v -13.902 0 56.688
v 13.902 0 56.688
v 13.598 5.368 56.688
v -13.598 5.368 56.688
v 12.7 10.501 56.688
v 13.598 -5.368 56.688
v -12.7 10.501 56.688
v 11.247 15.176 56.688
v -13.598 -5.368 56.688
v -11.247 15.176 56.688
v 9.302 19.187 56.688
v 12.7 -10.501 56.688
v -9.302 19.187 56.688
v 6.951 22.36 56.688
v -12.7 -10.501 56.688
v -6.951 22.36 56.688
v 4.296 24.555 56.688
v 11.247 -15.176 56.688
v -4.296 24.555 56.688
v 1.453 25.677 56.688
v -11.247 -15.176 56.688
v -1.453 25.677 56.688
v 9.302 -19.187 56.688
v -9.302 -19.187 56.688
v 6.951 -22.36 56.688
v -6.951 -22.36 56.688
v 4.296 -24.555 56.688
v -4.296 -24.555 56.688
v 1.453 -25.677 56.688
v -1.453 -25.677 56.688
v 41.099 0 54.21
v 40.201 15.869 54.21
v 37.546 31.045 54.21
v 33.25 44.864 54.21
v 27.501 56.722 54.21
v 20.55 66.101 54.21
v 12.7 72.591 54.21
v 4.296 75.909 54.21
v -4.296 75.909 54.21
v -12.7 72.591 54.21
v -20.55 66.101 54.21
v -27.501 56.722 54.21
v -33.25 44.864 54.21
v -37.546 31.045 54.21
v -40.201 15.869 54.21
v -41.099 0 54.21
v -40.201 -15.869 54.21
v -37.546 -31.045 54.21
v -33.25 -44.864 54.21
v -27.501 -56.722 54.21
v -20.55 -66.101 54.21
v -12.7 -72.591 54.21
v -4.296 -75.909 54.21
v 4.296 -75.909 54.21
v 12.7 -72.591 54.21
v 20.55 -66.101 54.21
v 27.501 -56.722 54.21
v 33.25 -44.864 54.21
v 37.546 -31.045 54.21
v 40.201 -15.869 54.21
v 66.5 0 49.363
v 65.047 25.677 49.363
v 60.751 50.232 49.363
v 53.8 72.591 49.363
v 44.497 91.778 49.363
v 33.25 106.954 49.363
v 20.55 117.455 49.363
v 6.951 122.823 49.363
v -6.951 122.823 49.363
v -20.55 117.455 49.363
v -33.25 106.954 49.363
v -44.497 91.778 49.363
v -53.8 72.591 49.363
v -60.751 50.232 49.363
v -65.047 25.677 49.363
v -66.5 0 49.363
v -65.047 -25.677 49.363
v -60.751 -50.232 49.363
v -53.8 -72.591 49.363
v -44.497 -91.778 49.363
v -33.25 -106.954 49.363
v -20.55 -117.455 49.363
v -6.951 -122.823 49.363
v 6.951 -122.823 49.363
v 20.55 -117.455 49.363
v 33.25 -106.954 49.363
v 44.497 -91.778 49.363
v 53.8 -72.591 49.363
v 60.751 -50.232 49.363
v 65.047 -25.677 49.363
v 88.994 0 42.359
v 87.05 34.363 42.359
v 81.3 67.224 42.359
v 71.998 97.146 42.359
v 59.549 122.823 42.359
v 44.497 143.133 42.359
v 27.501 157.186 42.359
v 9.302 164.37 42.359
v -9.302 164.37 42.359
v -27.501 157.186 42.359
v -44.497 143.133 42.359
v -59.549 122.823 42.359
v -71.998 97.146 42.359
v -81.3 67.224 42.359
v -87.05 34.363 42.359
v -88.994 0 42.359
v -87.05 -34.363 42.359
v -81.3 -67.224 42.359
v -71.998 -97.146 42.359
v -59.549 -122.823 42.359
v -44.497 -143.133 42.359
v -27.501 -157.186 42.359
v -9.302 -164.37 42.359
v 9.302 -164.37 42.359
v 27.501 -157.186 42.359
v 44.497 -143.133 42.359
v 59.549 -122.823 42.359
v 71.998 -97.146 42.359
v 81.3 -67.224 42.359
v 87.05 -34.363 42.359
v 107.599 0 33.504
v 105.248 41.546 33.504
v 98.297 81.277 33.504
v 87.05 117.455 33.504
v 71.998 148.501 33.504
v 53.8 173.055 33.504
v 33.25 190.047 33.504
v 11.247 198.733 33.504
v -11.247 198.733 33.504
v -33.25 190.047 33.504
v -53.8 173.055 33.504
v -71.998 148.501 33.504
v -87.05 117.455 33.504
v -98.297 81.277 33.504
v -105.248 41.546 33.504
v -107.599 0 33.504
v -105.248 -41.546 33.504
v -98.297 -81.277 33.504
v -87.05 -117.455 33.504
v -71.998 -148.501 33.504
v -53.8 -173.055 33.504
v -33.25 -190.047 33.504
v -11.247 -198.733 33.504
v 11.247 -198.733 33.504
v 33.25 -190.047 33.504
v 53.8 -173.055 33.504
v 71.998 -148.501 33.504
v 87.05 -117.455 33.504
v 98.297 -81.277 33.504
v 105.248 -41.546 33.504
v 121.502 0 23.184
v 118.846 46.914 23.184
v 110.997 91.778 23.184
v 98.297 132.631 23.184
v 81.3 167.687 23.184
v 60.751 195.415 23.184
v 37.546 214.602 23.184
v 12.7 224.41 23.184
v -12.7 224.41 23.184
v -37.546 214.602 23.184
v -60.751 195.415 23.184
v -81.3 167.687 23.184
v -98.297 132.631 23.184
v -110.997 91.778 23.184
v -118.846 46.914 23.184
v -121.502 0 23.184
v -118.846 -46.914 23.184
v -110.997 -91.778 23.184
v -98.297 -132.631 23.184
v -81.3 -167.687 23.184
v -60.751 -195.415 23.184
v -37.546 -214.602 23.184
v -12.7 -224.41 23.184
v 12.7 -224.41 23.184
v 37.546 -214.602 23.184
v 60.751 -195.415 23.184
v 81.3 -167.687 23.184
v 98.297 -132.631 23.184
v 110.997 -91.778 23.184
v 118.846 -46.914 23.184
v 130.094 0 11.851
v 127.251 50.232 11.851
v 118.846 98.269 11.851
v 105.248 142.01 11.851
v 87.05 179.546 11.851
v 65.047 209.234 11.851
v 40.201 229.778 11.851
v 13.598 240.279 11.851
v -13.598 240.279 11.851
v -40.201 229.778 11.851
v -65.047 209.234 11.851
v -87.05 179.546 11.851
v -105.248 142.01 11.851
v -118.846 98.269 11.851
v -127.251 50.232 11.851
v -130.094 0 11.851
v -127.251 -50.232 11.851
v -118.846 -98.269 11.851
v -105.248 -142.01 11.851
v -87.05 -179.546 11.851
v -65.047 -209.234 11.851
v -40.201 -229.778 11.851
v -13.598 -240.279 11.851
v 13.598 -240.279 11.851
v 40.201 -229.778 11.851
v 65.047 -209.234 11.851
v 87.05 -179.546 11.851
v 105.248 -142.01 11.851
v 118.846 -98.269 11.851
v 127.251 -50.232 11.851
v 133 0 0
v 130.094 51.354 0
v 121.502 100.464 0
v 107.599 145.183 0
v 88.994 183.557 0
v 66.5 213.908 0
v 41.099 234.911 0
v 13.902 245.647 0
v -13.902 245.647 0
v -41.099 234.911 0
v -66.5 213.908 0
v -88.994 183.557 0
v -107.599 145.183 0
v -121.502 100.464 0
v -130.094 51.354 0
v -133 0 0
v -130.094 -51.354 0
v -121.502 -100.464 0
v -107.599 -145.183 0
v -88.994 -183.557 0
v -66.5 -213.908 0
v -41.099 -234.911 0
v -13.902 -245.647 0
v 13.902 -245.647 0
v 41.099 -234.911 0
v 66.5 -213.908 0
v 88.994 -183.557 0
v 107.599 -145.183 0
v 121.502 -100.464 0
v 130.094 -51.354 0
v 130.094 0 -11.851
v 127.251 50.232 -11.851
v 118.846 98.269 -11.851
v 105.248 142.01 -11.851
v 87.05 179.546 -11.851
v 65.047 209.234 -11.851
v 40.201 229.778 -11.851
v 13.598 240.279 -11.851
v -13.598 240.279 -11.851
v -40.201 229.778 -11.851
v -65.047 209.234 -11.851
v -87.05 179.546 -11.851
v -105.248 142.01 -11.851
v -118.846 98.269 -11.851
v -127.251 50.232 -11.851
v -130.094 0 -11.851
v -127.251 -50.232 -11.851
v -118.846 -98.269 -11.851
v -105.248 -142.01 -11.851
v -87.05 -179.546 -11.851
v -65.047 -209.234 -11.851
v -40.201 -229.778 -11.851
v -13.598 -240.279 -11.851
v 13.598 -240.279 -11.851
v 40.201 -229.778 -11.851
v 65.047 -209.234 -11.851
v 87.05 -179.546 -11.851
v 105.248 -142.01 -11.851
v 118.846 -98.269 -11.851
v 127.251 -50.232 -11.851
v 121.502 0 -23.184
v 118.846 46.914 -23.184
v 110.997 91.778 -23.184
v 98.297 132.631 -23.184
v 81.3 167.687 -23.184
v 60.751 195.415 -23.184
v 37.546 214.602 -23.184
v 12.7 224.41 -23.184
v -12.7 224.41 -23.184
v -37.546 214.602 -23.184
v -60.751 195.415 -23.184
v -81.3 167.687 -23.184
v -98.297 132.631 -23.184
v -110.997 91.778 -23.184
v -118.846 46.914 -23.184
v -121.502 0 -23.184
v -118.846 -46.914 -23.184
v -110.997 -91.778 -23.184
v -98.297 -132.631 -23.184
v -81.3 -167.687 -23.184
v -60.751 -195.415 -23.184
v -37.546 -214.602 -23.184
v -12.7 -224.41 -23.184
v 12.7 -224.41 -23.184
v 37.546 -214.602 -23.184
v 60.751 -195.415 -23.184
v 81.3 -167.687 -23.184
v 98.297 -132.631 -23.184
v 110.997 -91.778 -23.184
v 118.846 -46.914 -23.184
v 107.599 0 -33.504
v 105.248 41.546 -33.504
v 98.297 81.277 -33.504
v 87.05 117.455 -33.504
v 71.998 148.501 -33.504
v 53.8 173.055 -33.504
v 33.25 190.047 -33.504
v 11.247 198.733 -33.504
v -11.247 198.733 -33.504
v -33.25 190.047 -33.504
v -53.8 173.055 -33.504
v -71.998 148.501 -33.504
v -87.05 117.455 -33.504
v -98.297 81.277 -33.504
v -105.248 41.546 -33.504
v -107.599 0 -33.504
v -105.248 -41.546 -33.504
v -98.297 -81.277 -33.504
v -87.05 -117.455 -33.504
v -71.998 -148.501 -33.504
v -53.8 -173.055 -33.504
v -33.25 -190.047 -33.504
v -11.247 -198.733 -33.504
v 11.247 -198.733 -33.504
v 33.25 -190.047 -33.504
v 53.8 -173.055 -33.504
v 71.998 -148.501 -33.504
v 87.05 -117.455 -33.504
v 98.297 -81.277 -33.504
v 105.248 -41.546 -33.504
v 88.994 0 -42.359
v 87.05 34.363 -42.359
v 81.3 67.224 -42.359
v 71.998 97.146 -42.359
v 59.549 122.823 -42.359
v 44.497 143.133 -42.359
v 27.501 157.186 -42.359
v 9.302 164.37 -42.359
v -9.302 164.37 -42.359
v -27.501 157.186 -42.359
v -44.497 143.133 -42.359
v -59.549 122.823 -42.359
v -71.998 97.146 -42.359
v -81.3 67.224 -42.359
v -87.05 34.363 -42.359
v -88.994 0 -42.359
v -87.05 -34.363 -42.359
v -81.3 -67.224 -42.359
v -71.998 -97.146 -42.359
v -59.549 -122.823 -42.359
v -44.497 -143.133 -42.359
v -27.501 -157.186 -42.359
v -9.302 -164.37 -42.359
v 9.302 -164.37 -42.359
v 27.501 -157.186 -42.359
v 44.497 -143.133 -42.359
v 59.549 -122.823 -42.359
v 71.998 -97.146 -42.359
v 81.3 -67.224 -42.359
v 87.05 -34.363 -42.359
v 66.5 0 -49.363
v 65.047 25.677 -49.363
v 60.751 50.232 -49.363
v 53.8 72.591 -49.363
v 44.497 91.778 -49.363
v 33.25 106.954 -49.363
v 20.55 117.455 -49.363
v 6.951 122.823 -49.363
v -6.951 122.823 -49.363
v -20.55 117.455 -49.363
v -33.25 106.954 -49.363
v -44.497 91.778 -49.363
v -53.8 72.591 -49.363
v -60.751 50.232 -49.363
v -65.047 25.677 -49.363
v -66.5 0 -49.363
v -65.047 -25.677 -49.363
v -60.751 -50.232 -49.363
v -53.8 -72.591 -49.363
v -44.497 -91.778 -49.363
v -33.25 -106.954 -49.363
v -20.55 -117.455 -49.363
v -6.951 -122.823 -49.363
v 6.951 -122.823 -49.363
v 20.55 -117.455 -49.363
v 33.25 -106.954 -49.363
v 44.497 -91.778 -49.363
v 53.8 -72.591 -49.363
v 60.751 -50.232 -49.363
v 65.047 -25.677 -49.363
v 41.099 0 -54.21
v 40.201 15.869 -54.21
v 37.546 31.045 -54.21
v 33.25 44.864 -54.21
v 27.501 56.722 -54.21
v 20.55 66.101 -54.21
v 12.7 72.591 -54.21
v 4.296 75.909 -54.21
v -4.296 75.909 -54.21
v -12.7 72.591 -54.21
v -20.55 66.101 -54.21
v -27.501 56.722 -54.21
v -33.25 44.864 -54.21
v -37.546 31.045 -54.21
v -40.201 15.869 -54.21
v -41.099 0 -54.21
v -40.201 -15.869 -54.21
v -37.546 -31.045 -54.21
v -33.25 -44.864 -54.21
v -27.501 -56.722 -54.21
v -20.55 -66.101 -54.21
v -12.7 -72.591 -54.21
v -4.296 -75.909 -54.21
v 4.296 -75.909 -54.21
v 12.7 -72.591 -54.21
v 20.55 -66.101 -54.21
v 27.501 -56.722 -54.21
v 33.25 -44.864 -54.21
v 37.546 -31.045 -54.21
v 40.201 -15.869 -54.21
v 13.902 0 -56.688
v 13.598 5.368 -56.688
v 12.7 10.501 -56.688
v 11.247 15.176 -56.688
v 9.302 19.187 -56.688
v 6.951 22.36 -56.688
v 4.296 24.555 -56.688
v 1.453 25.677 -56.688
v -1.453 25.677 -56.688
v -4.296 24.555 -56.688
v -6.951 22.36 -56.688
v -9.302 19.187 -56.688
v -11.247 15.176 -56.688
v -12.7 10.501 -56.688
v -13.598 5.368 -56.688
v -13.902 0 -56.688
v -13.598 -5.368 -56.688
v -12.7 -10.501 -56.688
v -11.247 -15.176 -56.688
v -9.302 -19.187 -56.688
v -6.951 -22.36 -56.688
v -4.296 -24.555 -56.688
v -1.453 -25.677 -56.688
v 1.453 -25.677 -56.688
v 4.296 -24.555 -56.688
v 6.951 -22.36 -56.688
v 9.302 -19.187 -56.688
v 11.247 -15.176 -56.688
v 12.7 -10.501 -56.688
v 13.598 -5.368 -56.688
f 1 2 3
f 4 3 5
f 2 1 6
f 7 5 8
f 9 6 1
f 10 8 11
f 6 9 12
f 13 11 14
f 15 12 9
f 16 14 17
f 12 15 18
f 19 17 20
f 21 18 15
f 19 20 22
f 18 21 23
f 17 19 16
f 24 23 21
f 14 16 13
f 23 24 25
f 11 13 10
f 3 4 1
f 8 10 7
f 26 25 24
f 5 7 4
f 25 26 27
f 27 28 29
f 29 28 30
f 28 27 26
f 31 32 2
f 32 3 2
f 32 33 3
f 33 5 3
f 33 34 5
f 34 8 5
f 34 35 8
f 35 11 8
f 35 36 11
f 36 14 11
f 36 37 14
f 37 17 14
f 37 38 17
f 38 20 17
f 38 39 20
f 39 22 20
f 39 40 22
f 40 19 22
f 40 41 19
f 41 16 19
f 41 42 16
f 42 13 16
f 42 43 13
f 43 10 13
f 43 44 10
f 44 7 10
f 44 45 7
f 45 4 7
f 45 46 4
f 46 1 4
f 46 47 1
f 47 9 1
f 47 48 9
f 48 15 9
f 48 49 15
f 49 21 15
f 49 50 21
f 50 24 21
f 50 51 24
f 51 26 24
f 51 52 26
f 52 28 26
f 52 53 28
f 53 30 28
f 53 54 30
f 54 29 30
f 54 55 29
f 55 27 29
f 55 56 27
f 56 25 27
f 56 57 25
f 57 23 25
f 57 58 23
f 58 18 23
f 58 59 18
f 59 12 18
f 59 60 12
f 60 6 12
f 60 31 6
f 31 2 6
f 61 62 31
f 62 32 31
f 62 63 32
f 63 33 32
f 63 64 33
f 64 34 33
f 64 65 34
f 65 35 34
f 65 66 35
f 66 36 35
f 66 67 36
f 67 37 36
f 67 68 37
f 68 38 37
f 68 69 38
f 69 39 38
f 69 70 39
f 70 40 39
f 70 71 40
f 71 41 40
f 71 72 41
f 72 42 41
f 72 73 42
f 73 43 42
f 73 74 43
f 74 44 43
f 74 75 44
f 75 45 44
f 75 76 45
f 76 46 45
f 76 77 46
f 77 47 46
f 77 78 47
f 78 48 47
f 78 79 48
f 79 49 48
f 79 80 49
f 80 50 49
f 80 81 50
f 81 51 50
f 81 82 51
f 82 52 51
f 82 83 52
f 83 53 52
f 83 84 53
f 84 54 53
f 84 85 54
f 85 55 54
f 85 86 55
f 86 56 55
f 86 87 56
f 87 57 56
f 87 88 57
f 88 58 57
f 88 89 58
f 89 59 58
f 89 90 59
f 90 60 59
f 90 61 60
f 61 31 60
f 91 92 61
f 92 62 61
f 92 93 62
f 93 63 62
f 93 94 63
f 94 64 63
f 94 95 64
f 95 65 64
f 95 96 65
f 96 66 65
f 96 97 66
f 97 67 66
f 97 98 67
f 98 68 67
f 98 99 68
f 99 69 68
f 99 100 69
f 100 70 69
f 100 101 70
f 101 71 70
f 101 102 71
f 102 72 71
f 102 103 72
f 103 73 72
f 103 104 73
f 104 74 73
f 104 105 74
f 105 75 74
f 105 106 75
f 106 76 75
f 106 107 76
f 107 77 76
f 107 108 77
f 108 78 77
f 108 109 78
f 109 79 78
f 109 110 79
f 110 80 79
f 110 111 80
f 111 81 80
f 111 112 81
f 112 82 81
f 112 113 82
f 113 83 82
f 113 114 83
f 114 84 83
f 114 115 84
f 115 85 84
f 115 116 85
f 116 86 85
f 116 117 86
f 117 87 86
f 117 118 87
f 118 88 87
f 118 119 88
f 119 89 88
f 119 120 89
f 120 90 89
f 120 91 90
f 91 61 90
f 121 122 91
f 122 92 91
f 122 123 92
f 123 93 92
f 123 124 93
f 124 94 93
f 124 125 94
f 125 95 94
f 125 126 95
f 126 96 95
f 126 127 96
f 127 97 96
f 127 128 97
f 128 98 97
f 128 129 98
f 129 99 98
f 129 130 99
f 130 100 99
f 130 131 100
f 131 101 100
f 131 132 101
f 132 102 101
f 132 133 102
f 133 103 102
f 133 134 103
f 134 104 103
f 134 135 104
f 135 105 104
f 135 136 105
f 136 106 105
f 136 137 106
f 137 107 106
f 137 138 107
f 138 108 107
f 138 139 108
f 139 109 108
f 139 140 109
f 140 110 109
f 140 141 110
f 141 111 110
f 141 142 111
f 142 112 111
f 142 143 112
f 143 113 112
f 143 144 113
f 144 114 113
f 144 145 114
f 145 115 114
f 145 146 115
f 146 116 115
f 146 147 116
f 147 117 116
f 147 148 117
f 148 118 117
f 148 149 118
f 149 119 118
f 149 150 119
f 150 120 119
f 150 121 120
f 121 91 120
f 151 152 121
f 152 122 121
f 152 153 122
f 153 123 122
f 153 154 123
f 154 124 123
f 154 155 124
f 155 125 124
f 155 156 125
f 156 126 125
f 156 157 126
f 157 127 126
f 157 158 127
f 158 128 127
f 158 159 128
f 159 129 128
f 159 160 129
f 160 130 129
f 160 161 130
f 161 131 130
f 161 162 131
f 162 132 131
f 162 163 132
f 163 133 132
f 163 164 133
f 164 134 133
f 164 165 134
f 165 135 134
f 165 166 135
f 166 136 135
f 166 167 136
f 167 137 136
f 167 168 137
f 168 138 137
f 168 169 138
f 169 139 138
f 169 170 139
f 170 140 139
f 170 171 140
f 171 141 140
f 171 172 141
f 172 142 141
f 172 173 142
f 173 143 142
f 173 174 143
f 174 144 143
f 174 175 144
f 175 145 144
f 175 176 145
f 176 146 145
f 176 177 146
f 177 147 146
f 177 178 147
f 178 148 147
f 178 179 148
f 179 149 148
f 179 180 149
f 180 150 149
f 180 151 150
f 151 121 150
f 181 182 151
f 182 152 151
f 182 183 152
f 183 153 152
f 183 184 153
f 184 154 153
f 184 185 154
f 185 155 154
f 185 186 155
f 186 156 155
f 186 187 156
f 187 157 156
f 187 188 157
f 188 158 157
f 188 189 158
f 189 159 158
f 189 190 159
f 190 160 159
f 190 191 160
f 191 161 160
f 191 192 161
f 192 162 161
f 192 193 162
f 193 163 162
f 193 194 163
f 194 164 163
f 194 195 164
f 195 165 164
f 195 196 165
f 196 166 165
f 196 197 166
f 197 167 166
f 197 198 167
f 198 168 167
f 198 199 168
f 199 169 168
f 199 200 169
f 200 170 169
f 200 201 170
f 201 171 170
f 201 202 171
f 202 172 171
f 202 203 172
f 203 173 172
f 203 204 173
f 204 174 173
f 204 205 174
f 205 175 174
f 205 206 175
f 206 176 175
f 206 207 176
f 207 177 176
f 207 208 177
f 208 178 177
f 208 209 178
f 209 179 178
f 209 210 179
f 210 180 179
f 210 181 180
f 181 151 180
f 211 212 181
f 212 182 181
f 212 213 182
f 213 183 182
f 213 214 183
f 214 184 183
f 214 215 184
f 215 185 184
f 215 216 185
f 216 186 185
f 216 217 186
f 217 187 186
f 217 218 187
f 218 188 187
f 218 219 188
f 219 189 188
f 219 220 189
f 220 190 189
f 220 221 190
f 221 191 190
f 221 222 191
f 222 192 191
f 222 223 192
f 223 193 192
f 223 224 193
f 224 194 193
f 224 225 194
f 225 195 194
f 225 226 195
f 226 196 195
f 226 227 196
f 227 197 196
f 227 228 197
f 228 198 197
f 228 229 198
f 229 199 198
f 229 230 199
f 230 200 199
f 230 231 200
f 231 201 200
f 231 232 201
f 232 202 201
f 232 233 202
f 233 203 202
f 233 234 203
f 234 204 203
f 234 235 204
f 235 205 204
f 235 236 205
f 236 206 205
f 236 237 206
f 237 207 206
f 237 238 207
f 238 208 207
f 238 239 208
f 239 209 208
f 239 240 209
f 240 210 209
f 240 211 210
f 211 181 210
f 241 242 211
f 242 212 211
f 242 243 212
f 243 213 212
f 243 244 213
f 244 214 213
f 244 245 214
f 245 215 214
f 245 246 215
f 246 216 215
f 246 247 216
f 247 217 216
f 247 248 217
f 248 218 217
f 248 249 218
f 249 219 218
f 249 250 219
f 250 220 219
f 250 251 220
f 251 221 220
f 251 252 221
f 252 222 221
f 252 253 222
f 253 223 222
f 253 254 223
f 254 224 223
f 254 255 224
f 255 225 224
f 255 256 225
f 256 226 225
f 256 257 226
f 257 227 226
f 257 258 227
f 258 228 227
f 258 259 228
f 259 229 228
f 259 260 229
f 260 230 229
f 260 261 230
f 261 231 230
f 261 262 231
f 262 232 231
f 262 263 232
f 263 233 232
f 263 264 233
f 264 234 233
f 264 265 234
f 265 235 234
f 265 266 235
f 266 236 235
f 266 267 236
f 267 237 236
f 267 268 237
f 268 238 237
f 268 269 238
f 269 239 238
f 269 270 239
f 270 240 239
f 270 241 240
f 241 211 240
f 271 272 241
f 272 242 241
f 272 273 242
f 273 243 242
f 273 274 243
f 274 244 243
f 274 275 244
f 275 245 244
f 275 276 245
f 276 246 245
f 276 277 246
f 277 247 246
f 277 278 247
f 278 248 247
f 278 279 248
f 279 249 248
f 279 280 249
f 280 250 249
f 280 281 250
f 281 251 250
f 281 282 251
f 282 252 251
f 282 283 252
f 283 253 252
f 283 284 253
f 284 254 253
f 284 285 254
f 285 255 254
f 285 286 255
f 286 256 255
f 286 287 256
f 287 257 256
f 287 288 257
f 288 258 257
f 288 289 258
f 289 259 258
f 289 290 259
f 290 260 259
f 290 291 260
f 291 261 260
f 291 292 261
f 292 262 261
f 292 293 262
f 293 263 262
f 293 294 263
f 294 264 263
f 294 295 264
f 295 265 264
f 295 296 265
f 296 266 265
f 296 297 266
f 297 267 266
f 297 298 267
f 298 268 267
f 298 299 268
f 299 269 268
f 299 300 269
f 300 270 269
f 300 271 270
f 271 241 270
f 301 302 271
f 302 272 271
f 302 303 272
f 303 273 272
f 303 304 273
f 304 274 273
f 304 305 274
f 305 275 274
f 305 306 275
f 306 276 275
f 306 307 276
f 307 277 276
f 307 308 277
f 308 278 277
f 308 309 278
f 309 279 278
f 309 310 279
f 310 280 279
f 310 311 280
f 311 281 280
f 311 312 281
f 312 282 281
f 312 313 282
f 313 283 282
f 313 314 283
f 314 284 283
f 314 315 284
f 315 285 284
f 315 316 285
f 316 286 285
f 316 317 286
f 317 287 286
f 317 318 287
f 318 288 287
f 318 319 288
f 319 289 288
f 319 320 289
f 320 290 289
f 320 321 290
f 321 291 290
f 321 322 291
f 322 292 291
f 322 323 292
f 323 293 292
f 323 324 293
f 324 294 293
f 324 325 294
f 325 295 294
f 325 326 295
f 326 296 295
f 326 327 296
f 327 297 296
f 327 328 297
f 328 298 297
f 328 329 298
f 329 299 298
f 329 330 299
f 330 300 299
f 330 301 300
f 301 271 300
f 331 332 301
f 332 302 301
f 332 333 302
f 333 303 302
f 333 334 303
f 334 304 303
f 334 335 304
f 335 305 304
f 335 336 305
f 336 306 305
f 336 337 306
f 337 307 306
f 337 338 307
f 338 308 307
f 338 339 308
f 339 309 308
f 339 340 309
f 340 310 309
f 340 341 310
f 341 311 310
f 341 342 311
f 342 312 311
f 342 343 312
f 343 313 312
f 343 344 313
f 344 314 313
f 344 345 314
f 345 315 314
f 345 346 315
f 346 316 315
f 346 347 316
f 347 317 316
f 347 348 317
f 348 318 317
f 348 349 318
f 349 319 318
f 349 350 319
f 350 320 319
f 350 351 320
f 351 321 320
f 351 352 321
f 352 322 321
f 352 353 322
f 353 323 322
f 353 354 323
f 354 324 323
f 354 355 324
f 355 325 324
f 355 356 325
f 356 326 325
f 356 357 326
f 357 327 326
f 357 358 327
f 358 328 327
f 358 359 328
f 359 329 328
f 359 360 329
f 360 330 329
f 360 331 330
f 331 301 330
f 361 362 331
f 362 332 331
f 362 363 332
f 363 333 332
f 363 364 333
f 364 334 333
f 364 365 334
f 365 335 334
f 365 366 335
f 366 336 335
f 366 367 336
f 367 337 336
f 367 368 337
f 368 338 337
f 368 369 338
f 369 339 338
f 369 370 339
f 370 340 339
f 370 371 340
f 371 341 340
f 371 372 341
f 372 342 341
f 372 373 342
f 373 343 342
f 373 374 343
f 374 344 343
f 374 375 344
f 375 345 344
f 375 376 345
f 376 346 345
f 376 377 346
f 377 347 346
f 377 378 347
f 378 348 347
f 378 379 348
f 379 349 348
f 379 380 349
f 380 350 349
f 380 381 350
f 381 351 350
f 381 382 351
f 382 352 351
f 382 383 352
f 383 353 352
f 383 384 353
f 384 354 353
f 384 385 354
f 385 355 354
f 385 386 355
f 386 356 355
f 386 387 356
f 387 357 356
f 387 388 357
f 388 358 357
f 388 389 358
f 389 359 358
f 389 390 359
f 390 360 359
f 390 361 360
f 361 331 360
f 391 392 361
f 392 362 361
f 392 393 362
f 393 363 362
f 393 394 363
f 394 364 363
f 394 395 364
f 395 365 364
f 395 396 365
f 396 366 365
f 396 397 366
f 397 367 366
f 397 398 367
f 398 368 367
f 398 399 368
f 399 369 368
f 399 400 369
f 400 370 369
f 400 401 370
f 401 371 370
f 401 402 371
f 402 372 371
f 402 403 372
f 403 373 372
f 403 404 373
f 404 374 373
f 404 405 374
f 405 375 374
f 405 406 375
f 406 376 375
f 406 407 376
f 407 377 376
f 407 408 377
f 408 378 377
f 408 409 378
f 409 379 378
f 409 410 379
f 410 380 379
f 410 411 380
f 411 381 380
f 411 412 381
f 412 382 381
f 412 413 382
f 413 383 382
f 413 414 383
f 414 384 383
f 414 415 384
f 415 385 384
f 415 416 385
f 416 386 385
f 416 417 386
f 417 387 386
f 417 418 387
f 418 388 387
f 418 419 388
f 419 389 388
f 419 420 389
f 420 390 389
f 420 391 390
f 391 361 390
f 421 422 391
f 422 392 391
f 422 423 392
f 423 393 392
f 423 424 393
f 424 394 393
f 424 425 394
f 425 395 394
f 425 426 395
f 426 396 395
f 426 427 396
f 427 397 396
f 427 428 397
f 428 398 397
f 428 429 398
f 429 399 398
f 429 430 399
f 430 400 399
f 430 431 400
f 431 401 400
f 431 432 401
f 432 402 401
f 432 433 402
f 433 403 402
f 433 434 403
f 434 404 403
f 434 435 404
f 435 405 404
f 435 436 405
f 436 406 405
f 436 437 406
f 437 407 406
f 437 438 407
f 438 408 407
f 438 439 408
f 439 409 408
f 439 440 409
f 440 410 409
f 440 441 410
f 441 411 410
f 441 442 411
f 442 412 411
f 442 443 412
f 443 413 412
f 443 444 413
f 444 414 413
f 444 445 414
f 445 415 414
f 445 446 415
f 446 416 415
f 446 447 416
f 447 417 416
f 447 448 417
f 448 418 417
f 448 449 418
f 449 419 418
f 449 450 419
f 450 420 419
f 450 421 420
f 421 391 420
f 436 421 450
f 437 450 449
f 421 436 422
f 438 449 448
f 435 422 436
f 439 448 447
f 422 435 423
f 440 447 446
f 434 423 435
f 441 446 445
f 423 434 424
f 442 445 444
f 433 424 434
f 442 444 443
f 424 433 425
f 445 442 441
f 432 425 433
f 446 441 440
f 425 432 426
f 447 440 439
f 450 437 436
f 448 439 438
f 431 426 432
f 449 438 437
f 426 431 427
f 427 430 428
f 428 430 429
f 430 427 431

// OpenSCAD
// Generated by SolidPython 1.0.1 on 2020-07-29 00:46:47


scale(v = [7, 13, 3]) {
	sphere(r = 19);
}
/***********************************************
*********      SolidPython code:      **********
************************************************
 
# import packages: SolidPython
from solid import *
from solid.utils import *
from itertools import chain, combinations, permutations


class Resize:

    def __init__(self, scad_file):
        self.scad_file = scad_file
        #self.scad_file = import_scad(scad_file)
        # cone/cylinder param:
        self.r1 = 0
        self.r2 = 0
        self.h = 0
        # rectangular prism param:
        self.w = 0
        self.l = 0
        # ellipse param:
        self.r = 0

    # import OpenScad code (file name corresponds to shape)


    # classify shape + parameters
    def assign(self, param1, param2, param3):
        if self.scad_file == 'cone.scad':
            self.r1 = param1
            self.r2 = param2
            self.h = param3
        elif self.scad_file == 'cylinder.scad':
            self.r1 = param1
            self.r2 = param2
            self.h = param3
        elif self.scad_file == 'rectangularPrism.scad':
            self.h = param1
            self.l = param2
            self.w = param3
        else:
            self.r = param1
            self.h = param2

    # resize parameters
    def iterate(self):
        x = range(3, 20, 2)
        i = 1
        if self.scad_file == 'cone.scad':
            tempList = list(permutations(x, 2))
            for temp in tempList:
                param1 = temp[0]
                param2 = temp[1]
                filepath = 'produced_scad_files/' + 'cone' + str(param1) + '_' + str(param2) + '_' + '.scad'
                scad_render_to_file(cylinder(h=param1, r1=param2, r2=0), filepath)

        elif self.scad_file == 'cylinder.scad':
            tempList = list(permutations(x, 3))
            for temp in tempList:
                param1 = temp[0]
                param2 = temp[1]
                filepath = 'produced_scad_files/' + 'cylinder' + str(param1) + '_' + str(param2) + '_' + '.scad'
                scad_render_to_file(cylinder(h=param1, r1=param2, r2=param2), filepath)

        elif self.scad_file == 'rectangularPrism.scad':
            tempList = list(permutations(x, 3))
            for temp in tempList:
                param1 = temp[0]
                param2 = temp[1]
                param3 = temp[2]
                filepath = 'produced_scad_files/' + 'rectangularPrism' + str(param1) + '_' + str(param2) + '_' + str(
                    param3) + '.scad'
                scad_render_to_file(cube(size=(param1, param2, param3)), filepath)

        elif self.scad_file == 'ellipse.scad':
            tempList = list(permutations(x, 4))
            for temp in tempList:
                param1 = temp[0]
                param2 = temp[1]
                param3 = temp[2]
                param4 = temp[3]
                filepath = 'produced_scad_files/' + 'ellipse' + str(param1) + '_' + str(param2) + '_' + str(param3) + '_' + str(param4) + '.scad'
                scad_render_to_file(scale([param1, param2, param3])(sphere(r=param4)), filepath)

    def render_to_scadfile(self):
        scad_render_to_file(scad, 'example.scad') 
 
************************************************/
